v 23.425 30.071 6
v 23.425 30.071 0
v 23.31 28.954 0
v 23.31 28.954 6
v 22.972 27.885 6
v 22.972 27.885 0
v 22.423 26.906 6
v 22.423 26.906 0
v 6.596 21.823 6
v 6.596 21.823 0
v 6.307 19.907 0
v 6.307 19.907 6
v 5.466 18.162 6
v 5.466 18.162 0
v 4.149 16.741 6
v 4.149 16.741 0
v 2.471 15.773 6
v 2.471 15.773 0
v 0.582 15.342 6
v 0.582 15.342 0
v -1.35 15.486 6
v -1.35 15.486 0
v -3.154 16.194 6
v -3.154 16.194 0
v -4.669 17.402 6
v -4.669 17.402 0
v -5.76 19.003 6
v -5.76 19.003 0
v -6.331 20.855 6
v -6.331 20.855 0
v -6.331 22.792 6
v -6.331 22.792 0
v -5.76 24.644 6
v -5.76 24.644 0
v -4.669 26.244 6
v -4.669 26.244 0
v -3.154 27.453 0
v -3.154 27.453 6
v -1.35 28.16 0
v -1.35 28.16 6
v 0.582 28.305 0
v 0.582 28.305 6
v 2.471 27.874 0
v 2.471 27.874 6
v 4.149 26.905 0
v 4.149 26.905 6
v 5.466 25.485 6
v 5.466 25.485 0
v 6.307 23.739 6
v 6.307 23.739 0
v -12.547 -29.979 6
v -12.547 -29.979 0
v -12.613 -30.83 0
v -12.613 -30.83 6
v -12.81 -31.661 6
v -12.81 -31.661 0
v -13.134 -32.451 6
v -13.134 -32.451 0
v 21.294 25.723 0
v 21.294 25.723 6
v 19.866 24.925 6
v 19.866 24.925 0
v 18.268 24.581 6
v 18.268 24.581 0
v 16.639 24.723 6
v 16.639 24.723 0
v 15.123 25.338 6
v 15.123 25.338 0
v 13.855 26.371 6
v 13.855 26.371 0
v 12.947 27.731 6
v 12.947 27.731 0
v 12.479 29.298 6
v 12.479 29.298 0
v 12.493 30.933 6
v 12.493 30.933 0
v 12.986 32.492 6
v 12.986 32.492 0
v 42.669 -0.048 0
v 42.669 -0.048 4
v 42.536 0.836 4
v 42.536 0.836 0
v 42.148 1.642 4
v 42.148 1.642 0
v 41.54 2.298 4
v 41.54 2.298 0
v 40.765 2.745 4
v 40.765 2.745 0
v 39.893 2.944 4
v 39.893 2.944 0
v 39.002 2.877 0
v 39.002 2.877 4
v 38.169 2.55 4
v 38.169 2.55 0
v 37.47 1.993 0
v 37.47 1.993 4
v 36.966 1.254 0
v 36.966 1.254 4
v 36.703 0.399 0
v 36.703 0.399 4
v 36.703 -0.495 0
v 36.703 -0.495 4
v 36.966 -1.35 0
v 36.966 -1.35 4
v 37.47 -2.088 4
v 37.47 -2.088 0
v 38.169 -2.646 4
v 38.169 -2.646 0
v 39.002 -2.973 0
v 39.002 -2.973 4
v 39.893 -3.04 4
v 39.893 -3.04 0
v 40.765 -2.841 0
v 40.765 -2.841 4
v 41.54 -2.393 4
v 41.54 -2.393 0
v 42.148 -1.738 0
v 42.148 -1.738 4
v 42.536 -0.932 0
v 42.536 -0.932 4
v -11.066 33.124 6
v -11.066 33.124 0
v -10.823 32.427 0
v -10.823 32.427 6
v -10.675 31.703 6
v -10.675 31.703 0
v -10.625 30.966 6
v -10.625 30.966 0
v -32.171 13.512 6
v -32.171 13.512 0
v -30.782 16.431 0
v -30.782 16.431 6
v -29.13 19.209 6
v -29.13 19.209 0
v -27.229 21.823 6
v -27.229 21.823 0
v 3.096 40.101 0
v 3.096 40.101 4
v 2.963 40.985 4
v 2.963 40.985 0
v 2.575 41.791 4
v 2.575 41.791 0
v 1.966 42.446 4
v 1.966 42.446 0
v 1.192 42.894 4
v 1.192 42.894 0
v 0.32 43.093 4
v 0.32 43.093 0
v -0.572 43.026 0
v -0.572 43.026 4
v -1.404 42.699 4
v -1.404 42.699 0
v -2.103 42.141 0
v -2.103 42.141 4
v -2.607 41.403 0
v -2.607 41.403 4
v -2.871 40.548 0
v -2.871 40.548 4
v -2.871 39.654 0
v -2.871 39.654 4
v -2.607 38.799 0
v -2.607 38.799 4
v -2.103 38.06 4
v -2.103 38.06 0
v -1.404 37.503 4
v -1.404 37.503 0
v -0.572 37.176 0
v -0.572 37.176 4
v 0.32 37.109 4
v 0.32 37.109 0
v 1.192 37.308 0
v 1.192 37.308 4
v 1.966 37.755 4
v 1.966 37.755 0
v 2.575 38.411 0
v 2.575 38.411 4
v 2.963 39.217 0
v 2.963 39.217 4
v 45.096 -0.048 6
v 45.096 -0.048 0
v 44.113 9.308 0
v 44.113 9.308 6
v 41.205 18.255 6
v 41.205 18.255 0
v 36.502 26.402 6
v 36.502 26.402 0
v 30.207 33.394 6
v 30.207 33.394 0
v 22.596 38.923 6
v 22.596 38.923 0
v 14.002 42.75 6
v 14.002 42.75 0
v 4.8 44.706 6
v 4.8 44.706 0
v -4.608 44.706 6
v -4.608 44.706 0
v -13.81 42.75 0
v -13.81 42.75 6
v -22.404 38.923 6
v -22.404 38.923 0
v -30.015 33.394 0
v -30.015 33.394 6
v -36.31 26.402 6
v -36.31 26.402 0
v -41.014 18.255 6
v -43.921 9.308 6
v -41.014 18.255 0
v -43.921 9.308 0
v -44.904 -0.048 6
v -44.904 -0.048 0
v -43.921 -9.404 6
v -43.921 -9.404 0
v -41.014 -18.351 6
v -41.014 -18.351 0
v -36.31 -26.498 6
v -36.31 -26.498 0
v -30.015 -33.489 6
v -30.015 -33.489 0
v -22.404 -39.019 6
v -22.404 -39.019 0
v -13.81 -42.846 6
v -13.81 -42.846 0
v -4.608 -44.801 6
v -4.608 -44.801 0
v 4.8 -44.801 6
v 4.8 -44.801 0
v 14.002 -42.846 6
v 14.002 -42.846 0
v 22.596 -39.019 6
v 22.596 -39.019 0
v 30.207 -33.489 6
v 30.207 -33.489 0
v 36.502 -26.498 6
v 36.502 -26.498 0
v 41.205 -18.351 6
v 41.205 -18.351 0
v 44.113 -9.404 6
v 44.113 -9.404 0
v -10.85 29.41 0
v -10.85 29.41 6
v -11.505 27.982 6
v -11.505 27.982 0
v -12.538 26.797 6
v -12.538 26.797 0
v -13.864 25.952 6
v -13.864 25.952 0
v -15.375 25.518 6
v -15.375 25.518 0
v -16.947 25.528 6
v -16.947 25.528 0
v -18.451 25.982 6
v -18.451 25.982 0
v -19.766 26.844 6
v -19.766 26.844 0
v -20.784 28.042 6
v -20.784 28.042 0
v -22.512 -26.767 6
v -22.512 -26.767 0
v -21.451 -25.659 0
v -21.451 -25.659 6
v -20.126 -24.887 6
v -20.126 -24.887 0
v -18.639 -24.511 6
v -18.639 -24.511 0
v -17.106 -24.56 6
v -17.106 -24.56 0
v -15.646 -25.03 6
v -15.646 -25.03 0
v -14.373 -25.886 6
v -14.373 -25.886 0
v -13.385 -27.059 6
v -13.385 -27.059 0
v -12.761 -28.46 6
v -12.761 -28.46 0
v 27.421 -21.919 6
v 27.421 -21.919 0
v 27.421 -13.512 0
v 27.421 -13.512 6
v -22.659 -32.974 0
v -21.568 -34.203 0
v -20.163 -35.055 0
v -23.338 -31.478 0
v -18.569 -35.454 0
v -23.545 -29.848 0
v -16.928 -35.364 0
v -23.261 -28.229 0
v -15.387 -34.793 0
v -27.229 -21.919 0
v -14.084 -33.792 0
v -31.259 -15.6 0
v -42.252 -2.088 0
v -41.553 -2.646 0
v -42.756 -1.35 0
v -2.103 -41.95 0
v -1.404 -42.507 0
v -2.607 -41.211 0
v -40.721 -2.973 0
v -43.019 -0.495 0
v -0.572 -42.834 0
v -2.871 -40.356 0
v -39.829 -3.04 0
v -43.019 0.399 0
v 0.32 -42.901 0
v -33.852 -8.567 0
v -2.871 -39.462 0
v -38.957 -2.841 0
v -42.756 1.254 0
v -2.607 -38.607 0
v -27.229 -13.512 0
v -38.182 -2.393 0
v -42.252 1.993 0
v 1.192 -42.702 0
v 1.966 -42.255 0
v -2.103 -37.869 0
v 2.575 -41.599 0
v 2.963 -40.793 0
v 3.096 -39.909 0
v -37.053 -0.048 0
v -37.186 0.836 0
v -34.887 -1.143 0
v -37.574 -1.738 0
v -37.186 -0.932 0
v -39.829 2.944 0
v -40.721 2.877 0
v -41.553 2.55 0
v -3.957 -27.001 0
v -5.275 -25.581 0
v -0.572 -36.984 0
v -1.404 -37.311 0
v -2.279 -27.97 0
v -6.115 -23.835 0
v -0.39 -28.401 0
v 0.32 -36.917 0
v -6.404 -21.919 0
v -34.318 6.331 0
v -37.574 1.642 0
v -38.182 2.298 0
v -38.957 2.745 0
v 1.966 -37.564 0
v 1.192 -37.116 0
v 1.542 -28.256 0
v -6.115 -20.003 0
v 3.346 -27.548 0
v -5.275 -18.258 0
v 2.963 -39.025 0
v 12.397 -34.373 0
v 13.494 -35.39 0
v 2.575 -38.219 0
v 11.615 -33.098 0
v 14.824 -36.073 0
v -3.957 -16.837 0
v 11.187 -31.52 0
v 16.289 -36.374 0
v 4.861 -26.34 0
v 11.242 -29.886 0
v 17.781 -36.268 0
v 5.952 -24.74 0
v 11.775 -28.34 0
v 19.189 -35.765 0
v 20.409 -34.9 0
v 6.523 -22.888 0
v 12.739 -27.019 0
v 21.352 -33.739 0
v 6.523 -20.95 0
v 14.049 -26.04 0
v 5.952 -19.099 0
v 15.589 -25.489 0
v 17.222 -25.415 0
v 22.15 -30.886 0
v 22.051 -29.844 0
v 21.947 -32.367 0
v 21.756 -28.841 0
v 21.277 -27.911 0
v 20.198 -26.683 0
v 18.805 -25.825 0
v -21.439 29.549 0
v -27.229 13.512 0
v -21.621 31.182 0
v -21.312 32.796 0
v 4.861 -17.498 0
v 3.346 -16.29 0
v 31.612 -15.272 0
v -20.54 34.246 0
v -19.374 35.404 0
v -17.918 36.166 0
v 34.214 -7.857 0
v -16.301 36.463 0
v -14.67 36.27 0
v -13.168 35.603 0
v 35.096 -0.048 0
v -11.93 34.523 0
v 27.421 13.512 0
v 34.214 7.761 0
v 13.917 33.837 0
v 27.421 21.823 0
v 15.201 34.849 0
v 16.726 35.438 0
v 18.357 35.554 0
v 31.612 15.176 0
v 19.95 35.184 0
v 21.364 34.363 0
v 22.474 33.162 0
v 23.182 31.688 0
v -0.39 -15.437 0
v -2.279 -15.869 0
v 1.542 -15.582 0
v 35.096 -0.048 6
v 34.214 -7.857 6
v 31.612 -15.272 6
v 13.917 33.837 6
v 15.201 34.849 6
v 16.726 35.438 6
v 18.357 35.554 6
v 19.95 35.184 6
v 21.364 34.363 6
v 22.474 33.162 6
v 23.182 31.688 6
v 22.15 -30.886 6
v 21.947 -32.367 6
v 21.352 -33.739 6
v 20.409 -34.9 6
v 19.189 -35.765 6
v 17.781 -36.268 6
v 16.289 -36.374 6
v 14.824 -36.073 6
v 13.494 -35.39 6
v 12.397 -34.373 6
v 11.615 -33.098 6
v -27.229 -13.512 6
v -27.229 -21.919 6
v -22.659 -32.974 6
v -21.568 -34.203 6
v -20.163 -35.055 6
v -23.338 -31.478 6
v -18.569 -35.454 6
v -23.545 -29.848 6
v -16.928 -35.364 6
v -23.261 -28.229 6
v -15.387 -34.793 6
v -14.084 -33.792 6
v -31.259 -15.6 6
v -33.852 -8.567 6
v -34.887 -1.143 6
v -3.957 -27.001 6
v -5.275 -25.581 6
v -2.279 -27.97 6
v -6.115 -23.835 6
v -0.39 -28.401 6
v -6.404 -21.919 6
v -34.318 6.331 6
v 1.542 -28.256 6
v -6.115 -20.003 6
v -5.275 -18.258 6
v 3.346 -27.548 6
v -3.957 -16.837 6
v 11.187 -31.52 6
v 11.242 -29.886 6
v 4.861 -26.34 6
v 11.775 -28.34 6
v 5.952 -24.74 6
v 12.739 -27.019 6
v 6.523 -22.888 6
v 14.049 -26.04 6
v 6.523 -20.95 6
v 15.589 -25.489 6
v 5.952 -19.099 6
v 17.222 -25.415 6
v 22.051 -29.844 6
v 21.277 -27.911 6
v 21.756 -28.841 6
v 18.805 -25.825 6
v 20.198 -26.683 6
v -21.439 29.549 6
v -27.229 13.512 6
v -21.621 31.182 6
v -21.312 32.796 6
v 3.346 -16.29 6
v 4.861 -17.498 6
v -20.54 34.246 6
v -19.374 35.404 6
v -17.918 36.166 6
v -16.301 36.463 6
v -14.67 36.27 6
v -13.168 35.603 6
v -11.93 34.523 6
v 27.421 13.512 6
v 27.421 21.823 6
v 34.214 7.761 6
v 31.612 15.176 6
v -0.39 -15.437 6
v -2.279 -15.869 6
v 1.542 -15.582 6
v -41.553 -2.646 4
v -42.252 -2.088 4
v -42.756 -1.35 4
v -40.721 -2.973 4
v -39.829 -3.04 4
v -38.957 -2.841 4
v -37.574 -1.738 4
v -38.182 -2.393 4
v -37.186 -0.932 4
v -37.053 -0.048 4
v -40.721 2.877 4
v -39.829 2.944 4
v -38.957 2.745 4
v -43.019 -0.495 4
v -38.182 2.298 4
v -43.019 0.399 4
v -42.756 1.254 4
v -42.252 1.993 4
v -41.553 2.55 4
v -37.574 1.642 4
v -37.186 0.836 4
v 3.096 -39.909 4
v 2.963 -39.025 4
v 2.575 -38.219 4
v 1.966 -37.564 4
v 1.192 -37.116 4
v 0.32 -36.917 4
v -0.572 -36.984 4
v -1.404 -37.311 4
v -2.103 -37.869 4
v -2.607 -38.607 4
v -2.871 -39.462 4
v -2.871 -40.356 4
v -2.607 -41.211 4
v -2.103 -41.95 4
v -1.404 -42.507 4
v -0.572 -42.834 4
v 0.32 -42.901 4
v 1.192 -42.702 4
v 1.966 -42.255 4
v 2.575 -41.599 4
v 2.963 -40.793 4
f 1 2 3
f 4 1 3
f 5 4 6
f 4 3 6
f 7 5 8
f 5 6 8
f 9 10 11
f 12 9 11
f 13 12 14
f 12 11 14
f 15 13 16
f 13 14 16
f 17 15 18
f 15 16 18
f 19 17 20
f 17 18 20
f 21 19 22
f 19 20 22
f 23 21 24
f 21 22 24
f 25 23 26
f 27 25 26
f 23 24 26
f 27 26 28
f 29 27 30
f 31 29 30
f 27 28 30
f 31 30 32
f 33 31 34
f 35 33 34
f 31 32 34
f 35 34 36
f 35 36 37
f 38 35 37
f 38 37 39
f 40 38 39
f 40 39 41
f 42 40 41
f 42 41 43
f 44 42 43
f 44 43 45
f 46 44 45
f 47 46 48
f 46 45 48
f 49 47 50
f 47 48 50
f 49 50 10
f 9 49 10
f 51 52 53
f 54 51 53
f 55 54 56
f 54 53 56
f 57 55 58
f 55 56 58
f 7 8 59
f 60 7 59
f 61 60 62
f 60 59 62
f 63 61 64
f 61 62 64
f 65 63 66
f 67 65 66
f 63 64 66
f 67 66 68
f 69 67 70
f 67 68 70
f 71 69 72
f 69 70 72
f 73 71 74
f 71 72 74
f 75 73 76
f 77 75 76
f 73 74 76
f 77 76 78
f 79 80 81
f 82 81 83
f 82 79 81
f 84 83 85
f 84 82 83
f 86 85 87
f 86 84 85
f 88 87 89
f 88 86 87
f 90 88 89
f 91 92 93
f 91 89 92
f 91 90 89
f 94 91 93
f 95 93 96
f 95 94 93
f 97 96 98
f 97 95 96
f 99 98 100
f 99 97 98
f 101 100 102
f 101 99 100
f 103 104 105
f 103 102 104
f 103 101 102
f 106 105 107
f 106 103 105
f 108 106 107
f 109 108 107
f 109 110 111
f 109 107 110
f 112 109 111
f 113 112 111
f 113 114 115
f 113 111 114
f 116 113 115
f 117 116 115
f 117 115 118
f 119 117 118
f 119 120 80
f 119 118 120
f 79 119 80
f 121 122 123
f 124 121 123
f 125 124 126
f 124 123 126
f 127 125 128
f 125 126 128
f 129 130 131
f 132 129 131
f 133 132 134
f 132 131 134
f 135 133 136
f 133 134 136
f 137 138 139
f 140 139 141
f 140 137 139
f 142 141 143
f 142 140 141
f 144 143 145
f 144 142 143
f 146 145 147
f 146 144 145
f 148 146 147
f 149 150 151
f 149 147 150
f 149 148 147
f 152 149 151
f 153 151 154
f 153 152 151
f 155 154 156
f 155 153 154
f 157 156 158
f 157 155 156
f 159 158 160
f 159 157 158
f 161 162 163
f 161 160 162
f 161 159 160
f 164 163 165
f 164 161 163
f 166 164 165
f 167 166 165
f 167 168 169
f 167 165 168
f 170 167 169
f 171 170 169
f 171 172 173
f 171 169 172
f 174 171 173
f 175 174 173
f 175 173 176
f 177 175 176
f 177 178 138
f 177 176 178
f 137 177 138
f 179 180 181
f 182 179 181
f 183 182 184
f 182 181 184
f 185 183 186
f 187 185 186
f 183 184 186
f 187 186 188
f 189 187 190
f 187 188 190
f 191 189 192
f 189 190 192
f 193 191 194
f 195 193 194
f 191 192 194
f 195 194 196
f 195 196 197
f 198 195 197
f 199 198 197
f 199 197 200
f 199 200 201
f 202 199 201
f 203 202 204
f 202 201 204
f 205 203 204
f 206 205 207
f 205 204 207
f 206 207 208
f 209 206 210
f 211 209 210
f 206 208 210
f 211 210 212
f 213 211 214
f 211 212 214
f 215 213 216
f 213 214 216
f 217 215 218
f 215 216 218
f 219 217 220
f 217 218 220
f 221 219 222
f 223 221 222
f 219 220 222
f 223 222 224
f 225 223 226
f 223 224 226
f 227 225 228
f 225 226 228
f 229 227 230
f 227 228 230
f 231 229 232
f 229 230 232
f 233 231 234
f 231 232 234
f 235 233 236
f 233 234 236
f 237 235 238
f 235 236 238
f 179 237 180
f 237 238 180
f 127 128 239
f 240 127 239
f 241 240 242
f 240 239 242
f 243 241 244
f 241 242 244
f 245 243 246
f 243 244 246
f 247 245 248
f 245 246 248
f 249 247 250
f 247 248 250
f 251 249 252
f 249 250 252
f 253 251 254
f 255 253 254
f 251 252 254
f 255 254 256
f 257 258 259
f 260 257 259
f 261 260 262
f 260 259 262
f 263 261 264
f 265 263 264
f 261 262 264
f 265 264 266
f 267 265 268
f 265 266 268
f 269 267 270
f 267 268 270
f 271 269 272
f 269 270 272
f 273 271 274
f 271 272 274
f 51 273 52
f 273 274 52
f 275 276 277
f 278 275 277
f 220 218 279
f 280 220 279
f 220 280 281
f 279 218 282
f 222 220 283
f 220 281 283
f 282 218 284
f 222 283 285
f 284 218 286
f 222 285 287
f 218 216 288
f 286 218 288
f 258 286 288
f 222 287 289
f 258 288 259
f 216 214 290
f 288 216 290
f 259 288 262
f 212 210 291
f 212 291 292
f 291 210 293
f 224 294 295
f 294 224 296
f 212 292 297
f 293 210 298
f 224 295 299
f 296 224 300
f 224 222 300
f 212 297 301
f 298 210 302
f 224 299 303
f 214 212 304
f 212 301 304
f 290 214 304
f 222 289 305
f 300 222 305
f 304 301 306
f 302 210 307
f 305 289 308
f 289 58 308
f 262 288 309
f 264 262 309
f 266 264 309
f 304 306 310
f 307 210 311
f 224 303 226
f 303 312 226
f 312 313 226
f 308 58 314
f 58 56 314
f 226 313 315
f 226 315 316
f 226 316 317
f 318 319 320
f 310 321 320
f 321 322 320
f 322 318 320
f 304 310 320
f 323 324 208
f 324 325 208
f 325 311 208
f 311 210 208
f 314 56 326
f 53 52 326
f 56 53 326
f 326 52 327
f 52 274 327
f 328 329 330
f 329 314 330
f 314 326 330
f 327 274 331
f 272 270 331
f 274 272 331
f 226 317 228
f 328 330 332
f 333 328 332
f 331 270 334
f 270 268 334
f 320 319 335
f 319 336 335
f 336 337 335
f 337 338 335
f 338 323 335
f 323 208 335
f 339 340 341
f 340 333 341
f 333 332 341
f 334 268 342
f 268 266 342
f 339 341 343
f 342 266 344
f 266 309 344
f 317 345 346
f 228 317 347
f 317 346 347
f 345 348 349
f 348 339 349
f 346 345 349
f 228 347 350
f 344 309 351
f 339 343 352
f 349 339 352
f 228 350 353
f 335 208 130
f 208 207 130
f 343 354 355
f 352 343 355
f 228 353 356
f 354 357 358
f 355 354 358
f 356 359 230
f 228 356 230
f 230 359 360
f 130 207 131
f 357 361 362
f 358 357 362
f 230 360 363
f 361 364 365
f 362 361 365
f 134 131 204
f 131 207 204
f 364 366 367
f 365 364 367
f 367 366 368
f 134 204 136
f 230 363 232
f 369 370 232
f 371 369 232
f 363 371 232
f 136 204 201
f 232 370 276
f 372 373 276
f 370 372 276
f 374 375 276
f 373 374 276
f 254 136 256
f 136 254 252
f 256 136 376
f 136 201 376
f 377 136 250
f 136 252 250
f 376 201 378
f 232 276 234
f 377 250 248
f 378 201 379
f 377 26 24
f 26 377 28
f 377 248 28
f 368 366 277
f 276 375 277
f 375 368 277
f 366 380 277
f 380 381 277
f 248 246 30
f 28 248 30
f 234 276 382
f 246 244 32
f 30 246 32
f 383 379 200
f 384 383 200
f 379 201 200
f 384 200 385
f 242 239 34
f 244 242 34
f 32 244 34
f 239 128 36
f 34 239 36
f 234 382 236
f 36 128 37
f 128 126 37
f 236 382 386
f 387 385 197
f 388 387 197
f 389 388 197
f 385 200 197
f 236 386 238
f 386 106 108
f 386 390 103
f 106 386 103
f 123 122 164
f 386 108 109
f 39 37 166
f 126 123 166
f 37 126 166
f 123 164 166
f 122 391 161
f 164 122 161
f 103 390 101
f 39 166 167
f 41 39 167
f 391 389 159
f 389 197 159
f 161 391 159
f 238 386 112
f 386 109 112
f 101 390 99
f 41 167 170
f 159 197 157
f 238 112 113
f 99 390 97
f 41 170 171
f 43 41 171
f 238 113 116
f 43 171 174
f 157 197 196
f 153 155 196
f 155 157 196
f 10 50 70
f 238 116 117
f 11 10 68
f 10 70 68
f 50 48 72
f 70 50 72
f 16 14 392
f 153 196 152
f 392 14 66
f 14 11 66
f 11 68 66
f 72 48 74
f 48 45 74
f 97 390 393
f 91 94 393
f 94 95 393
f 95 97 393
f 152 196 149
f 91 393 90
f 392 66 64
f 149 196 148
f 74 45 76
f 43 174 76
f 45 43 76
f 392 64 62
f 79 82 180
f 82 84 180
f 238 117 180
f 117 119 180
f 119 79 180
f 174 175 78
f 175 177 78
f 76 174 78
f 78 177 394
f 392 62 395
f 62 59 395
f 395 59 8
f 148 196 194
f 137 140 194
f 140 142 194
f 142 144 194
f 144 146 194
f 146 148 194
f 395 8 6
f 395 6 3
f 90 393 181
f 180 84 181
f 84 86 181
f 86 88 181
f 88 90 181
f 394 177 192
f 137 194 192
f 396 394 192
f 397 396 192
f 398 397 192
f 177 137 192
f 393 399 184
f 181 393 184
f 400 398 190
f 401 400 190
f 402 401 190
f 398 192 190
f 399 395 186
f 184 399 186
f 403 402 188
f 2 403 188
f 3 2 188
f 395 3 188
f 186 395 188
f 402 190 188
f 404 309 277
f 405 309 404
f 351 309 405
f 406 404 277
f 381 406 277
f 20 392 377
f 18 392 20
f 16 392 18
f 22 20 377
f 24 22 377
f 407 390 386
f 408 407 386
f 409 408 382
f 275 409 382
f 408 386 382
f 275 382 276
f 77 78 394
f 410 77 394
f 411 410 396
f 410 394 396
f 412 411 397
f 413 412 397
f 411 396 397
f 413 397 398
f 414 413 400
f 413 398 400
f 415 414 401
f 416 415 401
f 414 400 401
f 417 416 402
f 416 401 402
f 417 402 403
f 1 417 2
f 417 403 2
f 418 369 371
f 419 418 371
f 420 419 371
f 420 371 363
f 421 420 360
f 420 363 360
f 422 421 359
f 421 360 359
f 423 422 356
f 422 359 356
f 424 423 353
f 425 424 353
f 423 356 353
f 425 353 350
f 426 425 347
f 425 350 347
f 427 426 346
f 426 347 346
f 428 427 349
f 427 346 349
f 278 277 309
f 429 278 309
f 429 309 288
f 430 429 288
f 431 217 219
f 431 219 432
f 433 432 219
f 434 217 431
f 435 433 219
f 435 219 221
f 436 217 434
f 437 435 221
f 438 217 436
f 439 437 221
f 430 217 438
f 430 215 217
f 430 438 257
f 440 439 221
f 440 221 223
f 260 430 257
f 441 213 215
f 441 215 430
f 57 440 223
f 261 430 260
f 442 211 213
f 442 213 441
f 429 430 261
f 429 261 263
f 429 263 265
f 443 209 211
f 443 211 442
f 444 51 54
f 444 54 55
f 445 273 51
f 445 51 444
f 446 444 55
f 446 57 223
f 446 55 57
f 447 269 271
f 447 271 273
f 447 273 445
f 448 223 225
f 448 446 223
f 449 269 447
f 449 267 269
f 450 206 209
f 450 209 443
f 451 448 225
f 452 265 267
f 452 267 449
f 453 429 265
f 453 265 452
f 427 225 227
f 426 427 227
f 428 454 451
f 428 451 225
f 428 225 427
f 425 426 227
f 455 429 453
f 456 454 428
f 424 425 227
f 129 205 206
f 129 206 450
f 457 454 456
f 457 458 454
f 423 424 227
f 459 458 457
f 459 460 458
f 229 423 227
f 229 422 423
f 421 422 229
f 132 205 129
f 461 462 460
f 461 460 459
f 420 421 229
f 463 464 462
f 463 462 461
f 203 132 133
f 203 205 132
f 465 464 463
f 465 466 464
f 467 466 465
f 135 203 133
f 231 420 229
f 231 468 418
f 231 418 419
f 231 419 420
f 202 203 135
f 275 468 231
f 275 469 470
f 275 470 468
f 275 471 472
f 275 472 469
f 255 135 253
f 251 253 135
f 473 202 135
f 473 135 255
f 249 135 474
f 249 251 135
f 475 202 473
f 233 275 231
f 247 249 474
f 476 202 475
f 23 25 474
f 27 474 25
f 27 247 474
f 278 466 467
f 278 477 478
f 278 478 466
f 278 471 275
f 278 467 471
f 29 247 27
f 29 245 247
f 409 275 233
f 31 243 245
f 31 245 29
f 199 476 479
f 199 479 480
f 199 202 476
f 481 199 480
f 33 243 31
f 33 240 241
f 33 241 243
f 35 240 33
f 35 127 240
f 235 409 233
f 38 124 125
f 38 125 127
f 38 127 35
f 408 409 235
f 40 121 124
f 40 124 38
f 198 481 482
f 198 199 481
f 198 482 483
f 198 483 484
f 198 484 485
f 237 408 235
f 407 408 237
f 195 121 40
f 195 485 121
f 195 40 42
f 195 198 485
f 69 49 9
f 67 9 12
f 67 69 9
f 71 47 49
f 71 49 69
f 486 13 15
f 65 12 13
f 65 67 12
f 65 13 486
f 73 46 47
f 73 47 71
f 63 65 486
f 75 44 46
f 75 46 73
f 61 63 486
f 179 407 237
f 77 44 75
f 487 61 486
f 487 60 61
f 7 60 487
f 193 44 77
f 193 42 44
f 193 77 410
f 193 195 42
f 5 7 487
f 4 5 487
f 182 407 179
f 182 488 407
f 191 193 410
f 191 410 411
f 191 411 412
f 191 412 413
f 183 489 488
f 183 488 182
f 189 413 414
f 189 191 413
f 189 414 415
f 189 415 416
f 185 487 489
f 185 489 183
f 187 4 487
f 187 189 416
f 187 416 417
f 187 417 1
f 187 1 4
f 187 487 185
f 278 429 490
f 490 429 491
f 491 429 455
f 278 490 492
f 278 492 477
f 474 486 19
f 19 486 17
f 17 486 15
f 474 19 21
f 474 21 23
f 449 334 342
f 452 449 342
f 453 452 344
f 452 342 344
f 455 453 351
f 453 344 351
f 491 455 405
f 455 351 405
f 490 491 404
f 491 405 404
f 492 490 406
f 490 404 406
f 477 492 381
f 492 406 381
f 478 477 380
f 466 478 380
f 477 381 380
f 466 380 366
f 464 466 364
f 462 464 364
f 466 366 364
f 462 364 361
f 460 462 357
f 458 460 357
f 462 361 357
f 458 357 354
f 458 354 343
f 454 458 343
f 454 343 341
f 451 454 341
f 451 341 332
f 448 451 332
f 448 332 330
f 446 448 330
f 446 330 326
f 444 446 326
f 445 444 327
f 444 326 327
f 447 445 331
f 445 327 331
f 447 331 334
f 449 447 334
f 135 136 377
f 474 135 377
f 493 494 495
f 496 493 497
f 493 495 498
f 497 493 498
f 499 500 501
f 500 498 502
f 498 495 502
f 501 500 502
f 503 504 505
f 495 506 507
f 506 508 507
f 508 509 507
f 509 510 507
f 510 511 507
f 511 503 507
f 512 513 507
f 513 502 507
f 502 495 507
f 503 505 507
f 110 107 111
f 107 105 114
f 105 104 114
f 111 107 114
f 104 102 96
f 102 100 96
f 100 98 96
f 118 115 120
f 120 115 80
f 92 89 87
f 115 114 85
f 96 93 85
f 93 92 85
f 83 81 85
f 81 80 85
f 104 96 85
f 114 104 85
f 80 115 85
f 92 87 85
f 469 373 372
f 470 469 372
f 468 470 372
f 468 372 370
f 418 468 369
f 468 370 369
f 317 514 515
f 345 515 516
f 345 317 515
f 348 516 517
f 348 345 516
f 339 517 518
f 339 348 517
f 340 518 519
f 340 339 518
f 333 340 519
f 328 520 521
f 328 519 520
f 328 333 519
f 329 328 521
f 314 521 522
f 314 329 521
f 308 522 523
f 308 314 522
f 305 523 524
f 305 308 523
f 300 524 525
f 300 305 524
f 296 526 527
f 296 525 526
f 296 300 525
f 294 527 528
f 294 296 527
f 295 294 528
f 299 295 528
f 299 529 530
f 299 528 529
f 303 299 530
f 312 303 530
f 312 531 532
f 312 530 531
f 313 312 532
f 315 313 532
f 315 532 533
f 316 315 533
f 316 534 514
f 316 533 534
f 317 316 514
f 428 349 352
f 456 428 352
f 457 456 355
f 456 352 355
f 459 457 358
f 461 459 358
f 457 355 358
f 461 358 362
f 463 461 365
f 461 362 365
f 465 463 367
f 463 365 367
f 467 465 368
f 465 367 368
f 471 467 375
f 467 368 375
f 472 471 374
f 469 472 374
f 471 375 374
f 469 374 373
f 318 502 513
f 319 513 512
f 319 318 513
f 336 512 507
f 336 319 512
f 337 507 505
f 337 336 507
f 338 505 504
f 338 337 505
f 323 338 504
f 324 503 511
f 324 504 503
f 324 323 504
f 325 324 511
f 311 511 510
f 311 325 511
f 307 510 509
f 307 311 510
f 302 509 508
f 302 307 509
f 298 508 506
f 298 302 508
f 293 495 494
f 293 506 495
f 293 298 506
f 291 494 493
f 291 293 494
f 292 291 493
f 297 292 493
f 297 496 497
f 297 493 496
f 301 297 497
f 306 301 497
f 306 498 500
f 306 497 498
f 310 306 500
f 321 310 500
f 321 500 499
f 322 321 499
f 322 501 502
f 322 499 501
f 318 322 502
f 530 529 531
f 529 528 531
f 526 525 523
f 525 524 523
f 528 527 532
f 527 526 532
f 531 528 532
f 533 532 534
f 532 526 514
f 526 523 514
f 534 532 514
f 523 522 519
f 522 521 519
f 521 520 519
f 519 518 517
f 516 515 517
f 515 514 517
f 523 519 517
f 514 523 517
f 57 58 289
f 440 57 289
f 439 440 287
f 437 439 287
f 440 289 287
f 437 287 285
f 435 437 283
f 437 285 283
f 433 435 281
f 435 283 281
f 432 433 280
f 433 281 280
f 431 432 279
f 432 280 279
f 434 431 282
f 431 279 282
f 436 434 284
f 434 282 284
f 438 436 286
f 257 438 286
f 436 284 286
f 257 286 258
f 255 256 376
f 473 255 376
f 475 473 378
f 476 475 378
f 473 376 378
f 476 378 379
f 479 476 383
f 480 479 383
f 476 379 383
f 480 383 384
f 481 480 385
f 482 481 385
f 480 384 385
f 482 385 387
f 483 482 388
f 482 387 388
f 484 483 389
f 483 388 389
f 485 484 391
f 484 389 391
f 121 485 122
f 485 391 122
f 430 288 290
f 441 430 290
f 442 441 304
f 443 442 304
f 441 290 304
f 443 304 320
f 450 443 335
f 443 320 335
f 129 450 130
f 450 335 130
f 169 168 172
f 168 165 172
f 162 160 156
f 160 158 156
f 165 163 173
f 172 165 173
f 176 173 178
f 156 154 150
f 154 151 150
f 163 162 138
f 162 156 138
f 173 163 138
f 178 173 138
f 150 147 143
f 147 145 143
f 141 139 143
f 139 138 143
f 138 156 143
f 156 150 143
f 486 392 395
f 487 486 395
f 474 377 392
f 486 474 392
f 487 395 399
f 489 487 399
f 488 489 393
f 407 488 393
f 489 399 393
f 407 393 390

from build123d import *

# Parameters (mm, degrees)
F0_R     = 45
F0_R_2   = 3
F1_DEPTH = 6
F2_DEPTH = 6
F3_DEPTH = 6
F4_R     = 3.7046824746
F4_R_2   = 3.6592764752
F4_R_3   = 3.6139160681
F4_R_4   = 3.8159810343
F5_DEPTH = 2
F6_DEPTH = 2


with BuildPart() as f1:
    # F0 (on Top) → F1 (new body)
    with BuildSketch(Plane.XY):
        with Locations((0.0959349175, -0.0479674588)):
            Circle(F0_R)
        with Locations((0.0959349175, -39.9090653906)):
            Circle(F0_R_2, mode=Mode.SUBTRACT)
        with Locations((-40.0529677669, -0.0479674588)):
            Circle(F0_R_2, mode=Mode.SUBTRACT)
        with BuildLine():
            ThreePointArc((27.4207573821, 21.8233397102), (33.1214461646, 11.5414935671), (35.0959349175, -0.0479674588))
            ThreePointArc((35.0959349175, -0.0479674588), (33.1214461646, -11.6374284846), (27.4207573821, -21.9192746278))
            ThreePointArc((27.4207573821, -21.9192746278), (24.533111856, -25.104391451), (21.2767449211, -27.9114433294))
            ThreePointArc((21.2767449211, -27.9114433294), (21.9273327718, -29.335683713), (22.1502168829, -30.8855378658))
            ThreePointArc((22.1502168829, -30.8855378658), (17.7806491067, -36.268113735), (11.6148994329, -33.0981332147))
            ThreePointArc((11.6148994329, -33.0981332147), (-0.8185531736, -35.0360184409), (-13.1337970765, -32.4512727125))
            ThreePointArc((-13.1337970765, -32.4512727125), (-20.8976351843, -34.6820549215), (-22.5115050489, -26.7669430784))
            ThreePointArc((-22.5115050489, -26.7669430784), (-24.9875791947, -24.4573369668), (-27.228887547, -21.9192746278))
            ThreePointArc((-27.228887547, -21.9192746278), (-34.5685439732, -4.8826239339), (-32.1705090074, 13.512143029))
            ThreePointArc((-32.1705090074, 13.512143029), (-29.9880933208, 17.8392135644), (-27.228887547, 21.8233397102))
            ThreePointArc((-27.228887547, 21.8233397102), (-24.2059494655, 25.1396964948), (-20.7835404411, 28.042022017))
            ThreePointArc((-20.7835404411, 28.042022017), (-18.6742910421, 35.8397549184), (-11.0663916751, 33.1243472787))
            ThreePointArc((-11.0663916751, 33.1243472787), (1.0160924151, 34.9399348816), (12.9864428976, 32.4917744581))
            ThreePointArc((12.9864428976, 32.4917744581), (19.1675795097, 35.4283855992), (23.4248644926, 30.0706193309))
            ThreePointArc((23.4248644926, 30.0706193309), (23.1684252605, 28.4107788343), (22.4230206839, 26.9057195095))
            ThreePointArc((22.4230206839, 26.9057195095), (25.0516084979, 24.4920886975), (27.4207573821, 21.8233397102))
        make_face(mode=Mode.SUBTRACT)
        with Locations((39.6692280968, -0.0479674588)):
            Circle(F0_R_2, mode=Mode.SUBTRACT)
        with Locations((0.0959349175, 40.1009352257)):
            Circle(F0_R_2, mode=Mode.SUBTRACT)
        with BuildLine():
            ThreePointArc((21.2767449211, -27.9114433294), (24.533111856, -25.104391451), (27.4207573821, -21.9192746278))
            Line((27.4207573821, -21.9192746278), (6.5959349175, -21.9192746278))
            ThreePointArc((6.5959349175, -21.9192746278), (0.0959349175, -28.4192746278), (-6.4040650825, -21.9192746278))
            Line((-6.4040650825, -21.9192746278), (-27.228887547, -21.9192746278))
            ThreePointArc((-27.228887547, -21.9192746278), (-24.9875791947, -24.4573369668), (-22.5115050489, -26.7669430784))
            ThreePointArc((-22.5115050489, -26.7669430784), (-16.3594497928, -24.7438409966), (-12.5466565285, -29.9786603278))
            ThreePointArc((-12.5466565285, -29.9786603278), (-12.6954544679, -31.2493438081), (-13.1337970765, -32.4512727125))
            ThreePointArc((-13.1337970765, -32.4512727125), (-0.8185531736, -35.0360184409), (11.6148994329, -33.0981332147))
            ThreePointArc((11.6148994329, -33.0981332147), (14.0488297169, -26.0396339447), (21.2767449211, -27.9114433294))
        make_face()
        with BuildLine():
            Line((6.5959349175, 21.8233397102), (27.4207573821, 21.8233397102))
            ThreePointArc((27.4207573821, 21.8233397102), (25.0516084979, 24.4920886975), (22.4230206839, 26.9057195095))
            ThreePointArc((22.4230206839, 26.9057195095), (15.1231755594, 25.3376985497), (12.9864428976, 32.4917744581))
            ThreePointArc((12.9864428976, 32.4917744581), (1.0160924151, 34.9399348816), (-11.0663916751, 33.1243472787))
            ThreePointArc((-11.0663916751, 33.1243472787), (-10.7366623963, 32.0675422609), (-10.6252480106, 30.966113608))
            ThreePointArc((-10.6252480106, 30.966113608), (-14.6038355694, 25.6807277012), (-20.7835404411, 28.042022017))
            ThreePointArc((-20.7835404411, 28.042022017), (-24.2059494655, 25.1396964948), (-27.228887547, 21.8233397102))
            Line((-27.228887547, 21.8233397102), (-6.4040650825, 21.8233397102))
            ThreePointArc((-6.4040650825, 21.8233397102), (0.0959349175, 28.3233397102), (6.5959349175, 21.8233397102))
        make_face()
    extrude(amount=F1_DEPTH)

    # F0 (on Top) → F2 (join)
    with BuildSketch(Plane.XY):
        with BuildLine():
            Line((27.4207573821, 13.512143029), (27.4207573821, 21.8233397102))
            Line((27.4207573821, 21.8233397102), (6.5959349175, 21.8233397102))
            ThreePointArc((6.5959349175, 21.8233397102), (0.0959349175, 15.3233397102), (-6.4040650825, 21.8233397102))
            Line((-6.4040650825, 21.8233397102), (-27.228887547, 21.8233397102))
            Line((-27.228887547, 21.8233397102), (-27.228887547, 13.512143029))
            Line((-27.228887547, 13.512143029), (27.4207573821, 13.512143029))
        make_face()
    extrude(amount=F2_DEPTH)

    # F0 (on Top) → F3 (join)
    with BuildSketch(Plane.XY):
        with BuildLine():
            Line((6.5959349175, -21.9192746278), (27.4207573821, -21.9192746278))
            Line((27.4207573821, -21.9192746278), (27.4207573821, -13.512143029))
            Line((27.4207573821, -13.512143029), (-27.228887547, -13.512143029))
            Line((-27.228887547, -13.512143029), (-27.228887547, -21.9192746278))
            Line((-27.228887547, -21.9192746278), (-6.4040650825, -21.9192746278))
            ThreePointArc((-6.4040650825, -21.9192746278), (0.0959349175, -15.4192746278), (6.5959349175, -21.9192746278))
        make_face()
    extrude(amount=F3_DEPTH)

    # F4 (on face) → F5 (join)
    with BuildSketch(Plane.XY.offset(6)):
        with Locations((-40.0529677669, -0.0479674588)):
            Circle(F4_R)
        with Locations((0.0959349175, 40.1009352257)):
            Circle(F4_R_2)
        with Locations((39.6692280968, -0.0479674588)):
            Circle(F4_R_3)
        with Locations((0.0959349175, -39.9090653906)):
            Circle(F4_R_4)
    extrude(amount=-F5_DEPTH)

    # F4 (on face) → F6 (join)
    with BuildSketch(Plane.XY.offset(6)):
        with Locations((-40.0529677669, -0.0479674588)):
            Circle(F4_R)
        with Locations((0.0959349175, 40.1009352257)):
            Circle(F4_R_2)
        with Locations((39.6692280968, -0.0479674588)):
            Circle(F4_R_3)
        with Locations((0.0959349175, -39.9090653906)):
            Circle(F4_R_4)
    extrude(amount=-F6_DEPTH)


solid = f1.part
